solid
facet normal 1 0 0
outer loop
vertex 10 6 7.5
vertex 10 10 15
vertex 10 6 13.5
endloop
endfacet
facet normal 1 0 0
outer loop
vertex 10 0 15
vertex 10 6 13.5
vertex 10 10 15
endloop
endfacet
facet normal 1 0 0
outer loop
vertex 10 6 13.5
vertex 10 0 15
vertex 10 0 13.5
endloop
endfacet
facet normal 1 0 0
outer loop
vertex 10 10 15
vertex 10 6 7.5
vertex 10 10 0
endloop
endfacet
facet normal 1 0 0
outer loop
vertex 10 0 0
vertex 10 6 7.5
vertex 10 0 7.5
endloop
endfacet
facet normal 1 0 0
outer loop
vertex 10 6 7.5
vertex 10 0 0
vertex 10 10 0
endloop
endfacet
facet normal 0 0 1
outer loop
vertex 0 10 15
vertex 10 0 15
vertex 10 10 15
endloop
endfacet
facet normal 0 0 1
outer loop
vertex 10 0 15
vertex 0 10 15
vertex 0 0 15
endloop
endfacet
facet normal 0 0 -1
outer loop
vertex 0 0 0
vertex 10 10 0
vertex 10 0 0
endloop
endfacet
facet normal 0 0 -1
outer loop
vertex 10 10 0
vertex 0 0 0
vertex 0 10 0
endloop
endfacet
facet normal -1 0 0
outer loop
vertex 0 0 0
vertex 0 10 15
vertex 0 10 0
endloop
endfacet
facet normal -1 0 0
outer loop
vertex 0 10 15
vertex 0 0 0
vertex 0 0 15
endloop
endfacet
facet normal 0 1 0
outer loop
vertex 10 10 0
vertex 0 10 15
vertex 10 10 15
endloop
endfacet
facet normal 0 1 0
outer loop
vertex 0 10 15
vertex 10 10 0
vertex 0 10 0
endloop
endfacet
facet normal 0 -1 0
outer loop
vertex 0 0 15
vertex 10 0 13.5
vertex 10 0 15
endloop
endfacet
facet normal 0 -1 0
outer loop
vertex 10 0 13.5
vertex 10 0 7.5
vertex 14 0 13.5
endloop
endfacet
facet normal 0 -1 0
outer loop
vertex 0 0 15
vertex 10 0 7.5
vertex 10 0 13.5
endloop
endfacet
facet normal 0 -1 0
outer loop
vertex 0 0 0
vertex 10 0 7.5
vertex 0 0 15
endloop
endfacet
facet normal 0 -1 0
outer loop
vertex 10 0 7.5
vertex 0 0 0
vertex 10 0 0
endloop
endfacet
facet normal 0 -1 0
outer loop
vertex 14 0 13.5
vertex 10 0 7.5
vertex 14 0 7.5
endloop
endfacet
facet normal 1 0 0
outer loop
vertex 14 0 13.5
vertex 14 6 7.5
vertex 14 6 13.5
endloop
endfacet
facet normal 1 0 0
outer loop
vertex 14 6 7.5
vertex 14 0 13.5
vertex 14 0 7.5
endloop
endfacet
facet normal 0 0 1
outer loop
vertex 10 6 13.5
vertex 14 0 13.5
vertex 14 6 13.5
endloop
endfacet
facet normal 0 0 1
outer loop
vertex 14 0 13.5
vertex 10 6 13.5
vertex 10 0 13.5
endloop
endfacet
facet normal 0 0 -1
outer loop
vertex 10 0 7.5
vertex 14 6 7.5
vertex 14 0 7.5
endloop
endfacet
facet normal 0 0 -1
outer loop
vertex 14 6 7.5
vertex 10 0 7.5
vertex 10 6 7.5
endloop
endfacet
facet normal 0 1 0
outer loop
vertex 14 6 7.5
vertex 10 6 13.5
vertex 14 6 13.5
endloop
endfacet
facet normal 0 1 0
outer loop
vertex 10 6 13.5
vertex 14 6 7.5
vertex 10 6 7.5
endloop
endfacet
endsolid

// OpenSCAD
// Two named sub-features sharing one union(), written to overlap on purpose.
// The union() of two overlapping solids is still ONE valid watertight
// single-body shell, so check_connectivity.py and check_dimensions.py both
// stay clean while 180mm3 of material sits where it should not.
//
// SUBFEATURES: tower_main, motor_cradle

$fa = 2; $fs = 0.3;

part_height = 15;

module tower_main() {
    cuboid([10, 10, part_height]);
}

module motor_cradle() {
    translate([0, 0, part_height / 2]) cuboid([14, 6, 6]);
}

module part_geometry() {
    union() {
        tower_main();
        motor_cradle();
    }
}

// Same guarded switch as templates/part_template.scad -- without is_undef,
// -D 'SUBFEATURE="x"' is reassigned by this file and every solo render comes
// out as the whole part, which would make the overlap check compare the part
// against itself.
SUBFEATURE = is_undef(SUBFEATURE) ? "" : SUBFEATURE;

module subfeature_by_name(name) {
    if (name == "tower_main") tower_main();
    else if (name == "motor_cradle") motor_cradle();
    else assert(false, str("Unknown sub-feature '", name, "'"));
}

if (SUBFEATURE != "") subfeature_by_name(SUBFEATURE);
else part_geometry();

module cuboid(s) { cube(s, center = false); }
